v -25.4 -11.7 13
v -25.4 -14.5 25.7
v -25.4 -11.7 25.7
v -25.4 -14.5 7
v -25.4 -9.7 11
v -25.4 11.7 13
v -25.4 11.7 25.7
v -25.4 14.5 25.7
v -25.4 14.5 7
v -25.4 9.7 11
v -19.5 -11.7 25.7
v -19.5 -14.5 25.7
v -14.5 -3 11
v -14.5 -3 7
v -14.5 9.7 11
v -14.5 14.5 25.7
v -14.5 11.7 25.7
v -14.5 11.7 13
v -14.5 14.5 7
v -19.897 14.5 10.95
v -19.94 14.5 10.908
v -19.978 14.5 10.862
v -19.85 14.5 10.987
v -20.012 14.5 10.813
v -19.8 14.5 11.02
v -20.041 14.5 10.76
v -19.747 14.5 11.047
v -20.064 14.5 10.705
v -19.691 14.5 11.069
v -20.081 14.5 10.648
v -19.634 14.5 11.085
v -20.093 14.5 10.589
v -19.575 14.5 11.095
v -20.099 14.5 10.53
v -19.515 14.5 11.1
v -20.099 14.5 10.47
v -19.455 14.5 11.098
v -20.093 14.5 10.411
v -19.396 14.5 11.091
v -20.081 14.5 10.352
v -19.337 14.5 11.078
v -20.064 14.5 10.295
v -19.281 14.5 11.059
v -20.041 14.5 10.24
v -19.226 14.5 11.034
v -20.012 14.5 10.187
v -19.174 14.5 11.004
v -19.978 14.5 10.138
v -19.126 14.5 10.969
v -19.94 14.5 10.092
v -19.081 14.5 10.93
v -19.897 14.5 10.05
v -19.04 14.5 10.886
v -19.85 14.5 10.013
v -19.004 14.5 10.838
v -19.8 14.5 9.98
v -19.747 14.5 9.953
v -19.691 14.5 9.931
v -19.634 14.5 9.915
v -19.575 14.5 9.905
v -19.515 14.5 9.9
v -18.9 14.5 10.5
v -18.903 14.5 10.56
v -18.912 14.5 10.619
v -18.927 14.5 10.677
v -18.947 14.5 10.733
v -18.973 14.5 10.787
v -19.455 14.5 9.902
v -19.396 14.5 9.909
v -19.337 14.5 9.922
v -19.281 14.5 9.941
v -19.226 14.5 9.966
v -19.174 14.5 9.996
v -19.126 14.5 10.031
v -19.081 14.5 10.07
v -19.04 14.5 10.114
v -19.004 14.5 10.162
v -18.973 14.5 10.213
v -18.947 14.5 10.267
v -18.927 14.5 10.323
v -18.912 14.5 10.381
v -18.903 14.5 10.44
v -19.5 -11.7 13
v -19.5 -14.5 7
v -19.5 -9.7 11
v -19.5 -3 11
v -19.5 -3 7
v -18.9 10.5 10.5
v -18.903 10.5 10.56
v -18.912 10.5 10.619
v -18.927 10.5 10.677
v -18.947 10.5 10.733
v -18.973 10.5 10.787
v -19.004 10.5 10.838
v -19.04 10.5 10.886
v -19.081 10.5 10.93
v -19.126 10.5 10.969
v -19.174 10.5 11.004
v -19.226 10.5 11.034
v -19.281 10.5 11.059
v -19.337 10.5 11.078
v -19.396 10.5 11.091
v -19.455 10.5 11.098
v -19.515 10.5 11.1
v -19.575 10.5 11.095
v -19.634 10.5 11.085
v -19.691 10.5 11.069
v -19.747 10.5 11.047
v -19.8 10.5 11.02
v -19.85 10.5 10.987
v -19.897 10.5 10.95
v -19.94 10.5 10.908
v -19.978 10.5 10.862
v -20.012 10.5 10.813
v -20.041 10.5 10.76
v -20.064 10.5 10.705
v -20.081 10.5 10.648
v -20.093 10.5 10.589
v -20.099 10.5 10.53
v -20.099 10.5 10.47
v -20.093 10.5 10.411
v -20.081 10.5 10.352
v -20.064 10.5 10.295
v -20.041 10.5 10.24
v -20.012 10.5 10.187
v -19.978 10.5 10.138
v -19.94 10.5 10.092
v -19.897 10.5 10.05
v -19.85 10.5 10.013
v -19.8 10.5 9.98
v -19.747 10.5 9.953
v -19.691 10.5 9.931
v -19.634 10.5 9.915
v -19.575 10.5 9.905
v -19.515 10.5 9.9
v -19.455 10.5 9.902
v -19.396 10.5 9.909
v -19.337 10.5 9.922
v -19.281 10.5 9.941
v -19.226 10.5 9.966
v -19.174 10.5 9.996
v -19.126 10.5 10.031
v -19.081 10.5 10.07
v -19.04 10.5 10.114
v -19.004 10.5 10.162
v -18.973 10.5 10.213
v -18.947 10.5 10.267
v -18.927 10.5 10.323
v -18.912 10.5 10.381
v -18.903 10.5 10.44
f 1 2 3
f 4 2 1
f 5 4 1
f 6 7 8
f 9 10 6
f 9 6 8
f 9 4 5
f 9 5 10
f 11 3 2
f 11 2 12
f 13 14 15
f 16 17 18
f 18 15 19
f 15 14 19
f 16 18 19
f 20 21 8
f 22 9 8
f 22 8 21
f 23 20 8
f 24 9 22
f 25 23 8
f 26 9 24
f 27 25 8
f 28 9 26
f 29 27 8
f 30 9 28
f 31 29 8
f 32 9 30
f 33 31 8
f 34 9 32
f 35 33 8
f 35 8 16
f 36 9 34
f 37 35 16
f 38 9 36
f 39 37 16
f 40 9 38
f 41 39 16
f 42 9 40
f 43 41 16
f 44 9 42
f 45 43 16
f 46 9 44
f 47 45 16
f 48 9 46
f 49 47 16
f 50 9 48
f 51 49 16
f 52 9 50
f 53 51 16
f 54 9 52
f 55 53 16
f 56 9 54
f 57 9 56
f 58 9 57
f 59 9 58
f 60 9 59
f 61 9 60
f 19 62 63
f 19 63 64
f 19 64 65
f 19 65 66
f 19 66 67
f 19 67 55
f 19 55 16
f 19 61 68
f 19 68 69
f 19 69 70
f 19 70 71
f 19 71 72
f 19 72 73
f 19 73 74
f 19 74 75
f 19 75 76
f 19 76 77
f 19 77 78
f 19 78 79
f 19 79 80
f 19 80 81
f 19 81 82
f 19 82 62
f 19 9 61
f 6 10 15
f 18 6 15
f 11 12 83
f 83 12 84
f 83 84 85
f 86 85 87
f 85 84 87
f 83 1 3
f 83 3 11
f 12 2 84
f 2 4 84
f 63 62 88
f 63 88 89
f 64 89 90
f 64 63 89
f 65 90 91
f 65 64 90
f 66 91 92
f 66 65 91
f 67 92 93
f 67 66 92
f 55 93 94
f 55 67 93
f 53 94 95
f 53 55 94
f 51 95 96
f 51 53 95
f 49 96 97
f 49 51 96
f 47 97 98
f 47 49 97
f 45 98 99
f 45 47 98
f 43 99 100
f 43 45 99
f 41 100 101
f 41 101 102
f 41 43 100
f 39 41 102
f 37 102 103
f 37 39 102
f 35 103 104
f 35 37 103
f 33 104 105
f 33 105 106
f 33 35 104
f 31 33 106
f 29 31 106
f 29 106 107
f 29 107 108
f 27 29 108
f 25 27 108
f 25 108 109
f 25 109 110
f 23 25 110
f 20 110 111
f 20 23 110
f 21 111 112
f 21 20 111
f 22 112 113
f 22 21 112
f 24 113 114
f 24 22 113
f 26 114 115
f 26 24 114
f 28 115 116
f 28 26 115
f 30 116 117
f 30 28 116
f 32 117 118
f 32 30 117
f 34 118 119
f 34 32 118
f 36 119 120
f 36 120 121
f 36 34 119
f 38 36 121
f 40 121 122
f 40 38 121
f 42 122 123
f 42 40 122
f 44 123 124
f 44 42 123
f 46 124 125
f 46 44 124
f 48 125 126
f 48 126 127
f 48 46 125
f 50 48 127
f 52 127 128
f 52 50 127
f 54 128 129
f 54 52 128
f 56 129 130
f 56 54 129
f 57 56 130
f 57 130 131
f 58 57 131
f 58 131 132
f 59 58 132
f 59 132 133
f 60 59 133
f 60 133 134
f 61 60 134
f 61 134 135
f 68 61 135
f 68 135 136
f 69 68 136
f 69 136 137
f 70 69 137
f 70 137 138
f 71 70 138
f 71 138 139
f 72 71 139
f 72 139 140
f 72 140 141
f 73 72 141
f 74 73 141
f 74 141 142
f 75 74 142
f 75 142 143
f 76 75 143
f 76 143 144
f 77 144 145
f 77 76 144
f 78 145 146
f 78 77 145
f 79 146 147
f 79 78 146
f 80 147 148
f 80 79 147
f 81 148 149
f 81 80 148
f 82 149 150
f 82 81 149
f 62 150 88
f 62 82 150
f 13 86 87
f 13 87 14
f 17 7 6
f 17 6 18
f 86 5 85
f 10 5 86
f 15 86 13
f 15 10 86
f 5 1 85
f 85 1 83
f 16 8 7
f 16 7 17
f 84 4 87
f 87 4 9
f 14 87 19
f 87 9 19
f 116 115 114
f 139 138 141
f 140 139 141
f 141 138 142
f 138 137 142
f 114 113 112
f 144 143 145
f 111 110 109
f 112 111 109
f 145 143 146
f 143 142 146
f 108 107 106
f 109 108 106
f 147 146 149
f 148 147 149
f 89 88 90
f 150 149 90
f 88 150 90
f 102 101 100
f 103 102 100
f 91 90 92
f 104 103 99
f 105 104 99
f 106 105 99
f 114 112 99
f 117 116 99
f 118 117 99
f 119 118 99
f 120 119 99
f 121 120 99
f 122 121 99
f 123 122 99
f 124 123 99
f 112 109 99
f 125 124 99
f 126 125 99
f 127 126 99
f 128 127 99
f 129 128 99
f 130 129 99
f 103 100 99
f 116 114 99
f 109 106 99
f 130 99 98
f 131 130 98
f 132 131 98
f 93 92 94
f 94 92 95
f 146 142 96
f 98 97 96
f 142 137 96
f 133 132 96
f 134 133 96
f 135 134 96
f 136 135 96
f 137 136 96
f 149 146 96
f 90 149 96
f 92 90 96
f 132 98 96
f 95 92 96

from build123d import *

# Parameters (mm, degrees)
SKETCH026_W     = 10.9
SKETCH026_H     = 29
PAD009_DEPTH    = 4
SKETCH027_W     = 9
SKETCH027_H     = 14
POCKET015_DEPTH = 4.001
SKETCH028_W     = 5.9
SKETCH028_H     = 2.8
SKETCH028_W_2   = 10.9
PAD010_DEPTH    = 14.7
CHAMFER001_SIZE = 2
SKETCH033_R     = 0.6
POCKET016_DEPTH = 4


with BuildPart() as part:
    # Sketch026 (on DatumPlane) → Pad009 (new body)
    with BuildSketch(Plane.XY.offset(7)):
        with Locations((-19.95, 0)):
            Rectangle(SKETCH026_W, SKETCH026_H)
    extrude(amount=PAD009_DEPTH)

    # Sketch027 (on DatumPlane) → Pocket015 (cut, through all)
    with BuildSketch(Plane.XY.offset(11)):
        with Locations((-15, -10)):
            Rectangle(SKETCH027_W, SKETCH027_H)
    extrude(amount=-POCKET015_DEPTH, mode=Mode.SUBTRACT)

    # Sketch028 (on DatumPlane) → Pad010 (join)
    with BuildSketch(Plane.XY.offset(11)):
        with Locations((-22.45, -13.1)):
            Rectangle(SKETCH028_W, SKETCH028_H)
        with Locations((-19.95, 13.1)):
            Rectangle(SKETCH028_W_2, SKETCH028_H)
    extrude(amount=PAD010_DEPTH)

    # Chamfer001
    chamfer001_edges = [part.edges().sort_by_distance(p)[0] for p in [
        (-19.95, 11.7, 11),
        (-22.45, -11.7, 11),
    ]]
    chamfer(chamfer001_edges, length=CHAMFER001_SIZE)

    # Sketch033 (on DatumPlane) → Pocket016 (cut)
    with BuildSketch(Plane.XZ.offset(-14.5)):
        with Locations((-19.5, 10.5)):
            Circle(SKETCH033_R)
    extrude(amount=POCKET016_DEPTH, mode=Mode.SUBTRACT)


solid = part.part
